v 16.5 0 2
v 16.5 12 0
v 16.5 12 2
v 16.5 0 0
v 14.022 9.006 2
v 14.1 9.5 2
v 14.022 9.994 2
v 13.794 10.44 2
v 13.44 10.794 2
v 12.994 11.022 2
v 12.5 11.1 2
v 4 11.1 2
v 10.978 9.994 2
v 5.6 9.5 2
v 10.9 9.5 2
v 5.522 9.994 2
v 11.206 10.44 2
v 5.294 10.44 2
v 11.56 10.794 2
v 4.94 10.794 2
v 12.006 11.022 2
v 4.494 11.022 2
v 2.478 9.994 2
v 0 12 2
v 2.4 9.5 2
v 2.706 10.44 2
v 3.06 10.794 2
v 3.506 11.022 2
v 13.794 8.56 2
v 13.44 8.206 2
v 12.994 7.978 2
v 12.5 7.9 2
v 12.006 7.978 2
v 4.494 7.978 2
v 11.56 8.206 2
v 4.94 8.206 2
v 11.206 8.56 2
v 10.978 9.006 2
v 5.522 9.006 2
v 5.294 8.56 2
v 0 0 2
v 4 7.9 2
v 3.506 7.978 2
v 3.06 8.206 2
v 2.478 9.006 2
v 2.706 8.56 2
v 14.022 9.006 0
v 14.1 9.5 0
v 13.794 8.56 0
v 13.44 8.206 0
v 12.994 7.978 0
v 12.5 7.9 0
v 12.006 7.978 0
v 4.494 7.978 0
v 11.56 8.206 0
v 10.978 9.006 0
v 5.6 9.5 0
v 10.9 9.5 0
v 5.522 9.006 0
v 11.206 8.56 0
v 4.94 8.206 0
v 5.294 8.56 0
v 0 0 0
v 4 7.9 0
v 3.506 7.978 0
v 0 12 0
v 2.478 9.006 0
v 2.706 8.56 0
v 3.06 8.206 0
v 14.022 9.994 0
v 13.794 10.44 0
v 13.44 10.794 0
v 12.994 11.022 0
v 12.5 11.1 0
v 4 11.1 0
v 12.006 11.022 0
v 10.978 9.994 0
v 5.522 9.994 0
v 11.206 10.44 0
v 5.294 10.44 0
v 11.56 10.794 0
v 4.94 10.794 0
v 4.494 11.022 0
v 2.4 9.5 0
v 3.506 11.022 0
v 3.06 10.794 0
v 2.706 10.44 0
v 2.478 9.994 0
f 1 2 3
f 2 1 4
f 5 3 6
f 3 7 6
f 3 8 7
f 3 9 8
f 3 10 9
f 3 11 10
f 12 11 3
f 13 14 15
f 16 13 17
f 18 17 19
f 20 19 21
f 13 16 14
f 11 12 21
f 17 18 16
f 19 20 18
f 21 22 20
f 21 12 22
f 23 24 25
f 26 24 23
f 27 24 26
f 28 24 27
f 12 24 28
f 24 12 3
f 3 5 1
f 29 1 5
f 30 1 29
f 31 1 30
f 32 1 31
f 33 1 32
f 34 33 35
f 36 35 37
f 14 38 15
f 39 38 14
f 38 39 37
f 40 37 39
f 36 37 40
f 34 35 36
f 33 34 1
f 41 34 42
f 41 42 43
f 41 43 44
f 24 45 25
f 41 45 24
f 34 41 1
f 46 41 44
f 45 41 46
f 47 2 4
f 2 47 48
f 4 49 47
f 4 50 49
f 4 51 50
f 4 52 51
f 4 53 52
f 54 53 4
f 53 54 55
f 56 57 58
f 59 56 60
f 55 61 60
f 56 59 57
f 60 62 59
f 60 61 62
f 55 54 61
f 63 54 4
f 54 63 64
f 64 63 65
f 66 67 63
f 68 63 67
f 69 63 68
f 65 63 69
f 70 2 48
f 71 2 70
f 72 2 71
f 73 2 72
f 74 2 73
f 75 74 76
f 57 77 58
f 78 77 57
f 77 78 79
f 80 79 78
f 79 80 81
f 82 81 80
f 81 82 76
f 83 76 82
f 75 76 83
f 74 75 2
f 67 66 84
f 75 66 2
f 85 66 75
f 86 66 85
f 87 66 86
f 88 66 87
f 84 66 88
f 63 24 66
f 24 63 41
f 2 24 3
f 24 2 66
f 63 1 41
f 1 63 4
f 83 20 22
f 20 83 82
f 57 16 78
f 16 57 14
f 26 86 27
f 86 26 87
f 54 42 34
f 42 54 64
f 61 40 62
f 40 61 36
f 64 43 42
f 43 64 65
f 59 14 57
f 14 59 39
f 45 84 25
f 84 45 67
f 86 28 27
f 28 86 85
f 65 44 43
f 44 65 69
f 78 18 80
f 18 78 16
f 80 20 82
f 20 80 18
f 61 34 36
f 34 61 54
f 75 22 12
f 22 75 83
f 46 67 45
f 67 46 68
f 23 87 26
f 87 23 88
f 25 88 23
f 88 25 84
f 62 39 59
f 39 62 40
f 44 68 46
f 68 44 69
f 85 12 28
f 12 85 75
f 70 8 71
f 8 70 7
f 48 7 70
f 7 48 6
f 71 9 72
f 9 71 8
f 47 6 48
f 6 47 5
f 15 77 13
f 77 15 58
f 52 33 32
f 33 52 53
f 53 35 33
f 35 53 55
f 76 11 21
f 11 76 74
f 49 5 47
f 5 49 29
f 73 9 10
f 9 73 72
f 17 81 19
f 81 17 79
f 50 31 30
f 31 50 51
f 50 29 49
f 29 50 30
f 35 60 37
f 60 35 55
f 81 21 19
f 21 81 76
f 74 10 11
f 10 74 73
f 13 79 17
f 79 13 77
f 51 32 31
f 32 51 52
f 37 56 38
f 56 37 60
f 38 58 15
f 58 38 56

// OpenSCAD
// Lots of details to build a perfect Rostock MAX V3 enclosure.
MAIN_RADIUS = 240;
MAIN_HEIGHT = 6;

FN=30;
FN=120;
CORNER_RADIUS = 160.5;

BORDER_WALL = 2;
BORDER_HEIGHT = 3;
BORDER_MIDDLE_HEIGHT = 0.5;
BORDER_CUT_THICKNESS = 1.5;

ANGLE_OUT_SHIFT = 0;
ANGLE_WALL = 1.5;
ANGLE_SIDE = 10;
ANGLE_THICKNES = 2;
ANGLE_HEIGHT = 30;
ANGLE_LIFT = 0.7;
ANGLE_HOLDER_SIZE = ANGLE_WALL*2 + ANGLE_SIDE + ANGLE_LIFT;

THREAD_RADIUS = 1.8;

module pie_slice(r=3.0,a=30, h=10) {
  intersection() {
    cylinder(h, r, r);
    cube([r, r, r]);
    rotate([0, 0, a-90]) cube([r, r, r]);
  }
}

module angle_holder() {
    out_shift = MAIN_RADIUS-ANGLE_HOLDER_SIZE+ANGLE_WALL-BORDER_WALL+ANGLE_THICKNES+ANGLE_LIFT/2;
    translate([-ANGLE_HOLDER_SIZE, out_shift, 0])
    difference() {
        cube([ANGLE_HOLDER_SIZE*2, ANGLE_HOLDER_SIZE, ANGLE_HEIGHT]);
        
        
        translate([ANGLE_WALL+ANGLE_HOLDER_SIZE, ANGLE_WALL+ANGLE_SIDE-ANGLE_THICKNES-BORDER_CUT_THICKNESS, 0])
        cube([1000, ANGLE_THICKNES+ANGLE_LIFT+BORDER_CUT_THICKNESS, ANGLE_HEIGHT]);
        
        translate([ANGLE_WALL+ANGLE_HOLDER_SIZE, ANGLE_WALL, 0])
        cube([ANGLE_THICKNES+ANGLE_LIFT, ANGLE_SIDE+ANGLE_LIFT, ANGLE_HEIGHT]);
        
        translate([-ANGLE_WALL+ANGLE_HOLDER_SIZE-1000, ANGLE_WALL+ANGLE_SIDE-ANGLE_THICKNES-BORDER_CUT_THICKNESS, 0])
        cube([1000, ANGLE_THICKNES+ANGLE_LIFT+BORDER_CUT_THICKNESS, ANGLE_HEIGHT]);
        
        translate([ANGLE_HOLDER_SIZE-ANGLE_WALL-ANGLE_THICKNES-ANGLE_LIFT, ANGLE_WALL, 0])
        cube([ANGLE_THICKNES+ANGLE_LIFT, ANGLE_SIDE+ANGLE_LIFT, ANGLE_HEIGHT]);
    }
    
    translate([-ANGLE_HOLDER_SIZE, out_shift, 0])
    cube([ANGLE_HOLDER_SIZE*2, ANGLE_HOLDER_SIZE, MAIN_HEIGHT]);
}


module angle_holders() {
    for(i=[0:2]) {
        rotate([0, 0, 120*i])
        angle_holder();
    }
}


module angle_holder_cuts(lift=0) {
    for(i=[0:2]) {
        rotate([0, 0, 120*i])
        translate([-ANGLE_HOLDER_SIZE-lift/2, MAIN_RADIUS-ANGLE_HOLDER_SIZE-lift/2, 0])
        cube([ANGLE_HOLDER_SIZE*2+lift, ANGLE_HOLDER_SIZE+lift, 100]);
    }
}

module thread_cuts() {
    for(i=[0:2]) {
        // Near angle 1
        rotate([0, 0, 120*i])
        translate([-25, MAIN_RADIUS-16, 0])
        cylinder(100, THREAD_RADIUS, THREAD_RADIUS, $fn=20);
        
        // Near angle 2
        rotate([0, 0, 120*i])
        translate([25, MAIN_RADIUS-16, 0])
        cylinder(100, THREAD_RADIUS, THREAD_RADIUS, $fn=20);
        
        
        // Center 1
        rotate([0, 0, 120*i + 60])
        translate([-10, MAIN_RADIUS-45, 0])
        cylinder(100, THREAD_RADIUS, THREAD_RADIUS, $fn=20);
        
        // Center 2
        rotate([0, 0, 120*i + 60])
        translate([10, MAIN_RADIUS-45, 0])
        cylinder(100, THREAD_RADIUS, THREAD_RADIUS, $fn=20);
        
        // Center 1-2
        rotate([0, 0, 120*i + 60])
        translate([-10, MAIN_RADIUS-25, 0])
        cylinder(100, THREAD_RADIUS, THREAD_RADIUS, $fn=20);
        
        // Center 2-2
        rotate([0, 0, 120*i + 60])
        translate([10, MAIN_RADIUS-25, 0])
        cylinder(100, THREAD_RADIUS, THREAD_RADIUS, $fn=20);
    }
}

module base() {
    R=60.5;

    intersection() {
        union() {
            translate([-R*cos(30), -R*sin(30)])
            cylinder(MAIN_HEIGHT, CORNER_RADIUS, CORNER_RADIUS, $fn=FN);

            translate([R*cos(30), -R*sin(30)])
            cylinder(MAIN_HEIGHT, CORNER_RADIUS, CORNER_RADIUS, $fn=FN);
            
            translate([0, R])
            cylinder(MAIN_HEIGHT, CORNER_RADIUS, CORNER_RADIUS, $fn=FN);
        }    
        rotate([0, 0, 90])
        cylinder(100, 184*2, 184*2, $fn=3);       
    }

    intersection() {
        rotate([0, 0, 90])
        cylinder(MAIN_HEIGHT, 184*2, 184*2, $fn=3);   
        
        cylinder(MAIN_HEIGHT, 207, 207);
    }
}


module full_base() {
    difference() {
        cylinder(MAIN_HEIGHT, MAIN_RADIUS, MAIN_RADIUS, $fn=FN*2);
        base();
        thread_cuts();
    }

    // external wall
    translate([0, 0, MAIN_HEIGHT])
    difference() {
        cylinder(BORDER_HEIGHT, MAIN_RADIUS, MAIN_RADIUS, $fn=FN*2);
        cylinder(BORDER_HEIGHT, MAIN_RADIUS-BORDER_WALL, MAIN_RADIUS-BORDER_WALL, $fn=FN*2);
        
        angle_holder_cuts();
    }
    
    // Middle fill
    translate([0, 0, MAIN_HEIGHT])
    difference() {
        r = MAIN_RADIUS-BORDER_WALL;
        cylinder(BORDER_MIDDLE_HEIGHT, r, r, $fn=FN*2);
        cylinder(BORDER_MIDDLE_HEIGHT, r-BORDER_CUT_THICKNESS, r-BORDER_CUT_THICKNESS, $fn=FN*2);
        
        angle_holder_cuts();
    }

    // internal wall
    translate([0, 0, MAIN_HEIGHT])
    difference() {
        r = MAIN_RADIUS-BORDER_WALL-BORDER_CUT_THICKNESS;
        cylinder(BORDER_HEIGHT, r, r, $fn=FN*2);
        cylinder(BORDER_HEIGHT, r-BORDER_WALL, r-BORDER_WALL, $fn=FN*2);
        
        angle_holder_cuts();
    }
    
    angle_holders();
}

module center_holder(rounding=5, length=50, width=35, thickness=4) {
    linear_extrude(thickness) {
        difference() {
            translate([rounding, rounding])
            minkowski() {
                circle(rounding, $fn=FN);
                square([width-rounding*2, length-rounding*2]);
            }
            
            shift = 10;
            translate([width/2-10, 11+shift])
            circle(THREAD_RADIUS, $fn=20);
            
            translate([width/2+10, 11+shift])
            circle(THREAD_RADIUS, $fn=20);
            
            translate([width/2-10, 31+shift])
            circle(THREAD_RADIUS, $fn=20);
            
            translate([width/2+10, 31+shift])
            circle(THREAD_RADIUS, $fn=20);
            
            translate([width/2, 5])
            circle(THREAD_RADIUS, $fn=20);
        }
    }
}


*full_base();

*color("blue")
translate([0, 0, 5])
base();


*translate([0, 0, 0])
intersection() {
    full_base();
    
    rotate([0, 0, -60])
    pie_slice(r=MAIN_RADIUS+10, h=100, a=90+30);
}


*center_holder();


module side_holder(thickness=4) {
    ext_radius = MAIN_RADIUS-BORDER_WALL*2-BORDER_CUT_THICKNESS - 1;
    int_radius = ext_radius-16;
    hole_y_pos = 25;
    holder_len = hole_y_pos*2+30;
    
    translate([0, 0, 10])
    intersection() {
        difference() {
            cylinder(thickness, ext_radius, ext_radius, $fn=FN*2);
            cylinder(thickness, int_radius, int_radius, $fn=FN*2);
            angle_holder_cuts(lift=1.5);
            thread_cuts();
        }
        
        rotate([0, 0, -30])
        union() {
            translate([MAIN_RADIUS-100, -hole_y_pos-15, -50])
            cube([100, holder_len, 100]);
        }
    }
    
    // arm 1
    rotate([0, 0, -30])
    translate([int_radius-16, hole_y_pos-5, 10])
    difference() {    
        cube([20, 20, thickness]);
        
        translate([6, 10, 0])
        cylinder(thickness, THREAD_RADIUS, THREAD_RADIUS, $fn=20);
    }
    
    // arm 2
    rotate([0, 0, -30])
    translate([int_radius-16, -holder_len+hole_y_pos+15, 10])
    difference() {
        cube([20, 20, thickness]);
        translate([6, 10, 0])
        cylinder(thickness, THREAD_RADIUS, THREAD_RADIUS, $fn=20);
    }
}

*color("red")
side_holder();

///////////////////////////////////////////////////////////////

module camera_holder() {
    height = 40;
    platform_size = 15;
    
    cylinder(height, 2, 2, $fn=50);
    
    translate([0, 0, height])
    cylinder(4, 2, 5, $fn=50);
    
    translate([0, 0, height+4])
    difference() {
        cylinder(4, 5, 5, $fn=50);
        cylinder(4, 2.5, 2.5, $fn=30);
    }
    
    translate([0, 0, 3/2])
    cube([3, platform_size*2, 3], center=true);
    
    translate([0, 0, 3/2])
    cube([platform_size*2, 3, 3], center=true);
}

*camera_holder();


///////////////////////////////////////////////////////////////


module holder_pad_1(thickness) {
    difference() {
        cube([12, 50, thickness]);
        
        translate([6, 4.5, 0])
        cylinder(10, 3, 3, $fn=20);
        
        translate([6, 45, 0])
        cylinder(10, 3, 3, $fn=20);
    }
}

module holder_pad_2(thickness) {
    difference() {
        cube([12, 50, thickness]);
        
        translate([6, 15.5, 0])
        cylinder(10, 3, 3, $fn=20);
        
        translate([6, 34, 0])
        cylinder(10, 3, 3, $fn=20);
    }
}

*holder_pad_1(3);

*translate([15, 0])
holder_pad_1(2);

*translate([30, 0])
holder_pad_2(3);

*translate([45, 0])
holder_pad_2(2);


module magnet_holder(holder_size=20) {
    size = 12.5;
    wall = 2;
    thread = 1.6;
    
    difference() {
        cube([size + wall*2, 12, wall]);
        
        translate([4, 9.5], $fn=20)
        cylinder(wall, thread, thread);
        
        translate([size + wall*2 - 4, 9.5], $fn=20)
        cylinder(wall, thread, thread);
    }
    

    
    difference() {
        color("blue")
        translate([wall, -size-holder_size, wall])
        minkowski() {
            cube([size, size+holder_size, size]);
            sphere(wall, $fn=40);
        }
        
        translate([wall, wall-size-wall, wall])
        cube([size, size, size+wall*10]);
    }
    
    
    !difference() {
        cube([size + wall*2, 12, wall]);
        
        translate([4, 9.5], $fn=20)
        cylinder(wall, thread, thread);
        
        translate([size + wall*2 - 4, 9.5], $fn=20)
        cylinder(wall, thread, thread);
    }
}

magnet_holder(20);
